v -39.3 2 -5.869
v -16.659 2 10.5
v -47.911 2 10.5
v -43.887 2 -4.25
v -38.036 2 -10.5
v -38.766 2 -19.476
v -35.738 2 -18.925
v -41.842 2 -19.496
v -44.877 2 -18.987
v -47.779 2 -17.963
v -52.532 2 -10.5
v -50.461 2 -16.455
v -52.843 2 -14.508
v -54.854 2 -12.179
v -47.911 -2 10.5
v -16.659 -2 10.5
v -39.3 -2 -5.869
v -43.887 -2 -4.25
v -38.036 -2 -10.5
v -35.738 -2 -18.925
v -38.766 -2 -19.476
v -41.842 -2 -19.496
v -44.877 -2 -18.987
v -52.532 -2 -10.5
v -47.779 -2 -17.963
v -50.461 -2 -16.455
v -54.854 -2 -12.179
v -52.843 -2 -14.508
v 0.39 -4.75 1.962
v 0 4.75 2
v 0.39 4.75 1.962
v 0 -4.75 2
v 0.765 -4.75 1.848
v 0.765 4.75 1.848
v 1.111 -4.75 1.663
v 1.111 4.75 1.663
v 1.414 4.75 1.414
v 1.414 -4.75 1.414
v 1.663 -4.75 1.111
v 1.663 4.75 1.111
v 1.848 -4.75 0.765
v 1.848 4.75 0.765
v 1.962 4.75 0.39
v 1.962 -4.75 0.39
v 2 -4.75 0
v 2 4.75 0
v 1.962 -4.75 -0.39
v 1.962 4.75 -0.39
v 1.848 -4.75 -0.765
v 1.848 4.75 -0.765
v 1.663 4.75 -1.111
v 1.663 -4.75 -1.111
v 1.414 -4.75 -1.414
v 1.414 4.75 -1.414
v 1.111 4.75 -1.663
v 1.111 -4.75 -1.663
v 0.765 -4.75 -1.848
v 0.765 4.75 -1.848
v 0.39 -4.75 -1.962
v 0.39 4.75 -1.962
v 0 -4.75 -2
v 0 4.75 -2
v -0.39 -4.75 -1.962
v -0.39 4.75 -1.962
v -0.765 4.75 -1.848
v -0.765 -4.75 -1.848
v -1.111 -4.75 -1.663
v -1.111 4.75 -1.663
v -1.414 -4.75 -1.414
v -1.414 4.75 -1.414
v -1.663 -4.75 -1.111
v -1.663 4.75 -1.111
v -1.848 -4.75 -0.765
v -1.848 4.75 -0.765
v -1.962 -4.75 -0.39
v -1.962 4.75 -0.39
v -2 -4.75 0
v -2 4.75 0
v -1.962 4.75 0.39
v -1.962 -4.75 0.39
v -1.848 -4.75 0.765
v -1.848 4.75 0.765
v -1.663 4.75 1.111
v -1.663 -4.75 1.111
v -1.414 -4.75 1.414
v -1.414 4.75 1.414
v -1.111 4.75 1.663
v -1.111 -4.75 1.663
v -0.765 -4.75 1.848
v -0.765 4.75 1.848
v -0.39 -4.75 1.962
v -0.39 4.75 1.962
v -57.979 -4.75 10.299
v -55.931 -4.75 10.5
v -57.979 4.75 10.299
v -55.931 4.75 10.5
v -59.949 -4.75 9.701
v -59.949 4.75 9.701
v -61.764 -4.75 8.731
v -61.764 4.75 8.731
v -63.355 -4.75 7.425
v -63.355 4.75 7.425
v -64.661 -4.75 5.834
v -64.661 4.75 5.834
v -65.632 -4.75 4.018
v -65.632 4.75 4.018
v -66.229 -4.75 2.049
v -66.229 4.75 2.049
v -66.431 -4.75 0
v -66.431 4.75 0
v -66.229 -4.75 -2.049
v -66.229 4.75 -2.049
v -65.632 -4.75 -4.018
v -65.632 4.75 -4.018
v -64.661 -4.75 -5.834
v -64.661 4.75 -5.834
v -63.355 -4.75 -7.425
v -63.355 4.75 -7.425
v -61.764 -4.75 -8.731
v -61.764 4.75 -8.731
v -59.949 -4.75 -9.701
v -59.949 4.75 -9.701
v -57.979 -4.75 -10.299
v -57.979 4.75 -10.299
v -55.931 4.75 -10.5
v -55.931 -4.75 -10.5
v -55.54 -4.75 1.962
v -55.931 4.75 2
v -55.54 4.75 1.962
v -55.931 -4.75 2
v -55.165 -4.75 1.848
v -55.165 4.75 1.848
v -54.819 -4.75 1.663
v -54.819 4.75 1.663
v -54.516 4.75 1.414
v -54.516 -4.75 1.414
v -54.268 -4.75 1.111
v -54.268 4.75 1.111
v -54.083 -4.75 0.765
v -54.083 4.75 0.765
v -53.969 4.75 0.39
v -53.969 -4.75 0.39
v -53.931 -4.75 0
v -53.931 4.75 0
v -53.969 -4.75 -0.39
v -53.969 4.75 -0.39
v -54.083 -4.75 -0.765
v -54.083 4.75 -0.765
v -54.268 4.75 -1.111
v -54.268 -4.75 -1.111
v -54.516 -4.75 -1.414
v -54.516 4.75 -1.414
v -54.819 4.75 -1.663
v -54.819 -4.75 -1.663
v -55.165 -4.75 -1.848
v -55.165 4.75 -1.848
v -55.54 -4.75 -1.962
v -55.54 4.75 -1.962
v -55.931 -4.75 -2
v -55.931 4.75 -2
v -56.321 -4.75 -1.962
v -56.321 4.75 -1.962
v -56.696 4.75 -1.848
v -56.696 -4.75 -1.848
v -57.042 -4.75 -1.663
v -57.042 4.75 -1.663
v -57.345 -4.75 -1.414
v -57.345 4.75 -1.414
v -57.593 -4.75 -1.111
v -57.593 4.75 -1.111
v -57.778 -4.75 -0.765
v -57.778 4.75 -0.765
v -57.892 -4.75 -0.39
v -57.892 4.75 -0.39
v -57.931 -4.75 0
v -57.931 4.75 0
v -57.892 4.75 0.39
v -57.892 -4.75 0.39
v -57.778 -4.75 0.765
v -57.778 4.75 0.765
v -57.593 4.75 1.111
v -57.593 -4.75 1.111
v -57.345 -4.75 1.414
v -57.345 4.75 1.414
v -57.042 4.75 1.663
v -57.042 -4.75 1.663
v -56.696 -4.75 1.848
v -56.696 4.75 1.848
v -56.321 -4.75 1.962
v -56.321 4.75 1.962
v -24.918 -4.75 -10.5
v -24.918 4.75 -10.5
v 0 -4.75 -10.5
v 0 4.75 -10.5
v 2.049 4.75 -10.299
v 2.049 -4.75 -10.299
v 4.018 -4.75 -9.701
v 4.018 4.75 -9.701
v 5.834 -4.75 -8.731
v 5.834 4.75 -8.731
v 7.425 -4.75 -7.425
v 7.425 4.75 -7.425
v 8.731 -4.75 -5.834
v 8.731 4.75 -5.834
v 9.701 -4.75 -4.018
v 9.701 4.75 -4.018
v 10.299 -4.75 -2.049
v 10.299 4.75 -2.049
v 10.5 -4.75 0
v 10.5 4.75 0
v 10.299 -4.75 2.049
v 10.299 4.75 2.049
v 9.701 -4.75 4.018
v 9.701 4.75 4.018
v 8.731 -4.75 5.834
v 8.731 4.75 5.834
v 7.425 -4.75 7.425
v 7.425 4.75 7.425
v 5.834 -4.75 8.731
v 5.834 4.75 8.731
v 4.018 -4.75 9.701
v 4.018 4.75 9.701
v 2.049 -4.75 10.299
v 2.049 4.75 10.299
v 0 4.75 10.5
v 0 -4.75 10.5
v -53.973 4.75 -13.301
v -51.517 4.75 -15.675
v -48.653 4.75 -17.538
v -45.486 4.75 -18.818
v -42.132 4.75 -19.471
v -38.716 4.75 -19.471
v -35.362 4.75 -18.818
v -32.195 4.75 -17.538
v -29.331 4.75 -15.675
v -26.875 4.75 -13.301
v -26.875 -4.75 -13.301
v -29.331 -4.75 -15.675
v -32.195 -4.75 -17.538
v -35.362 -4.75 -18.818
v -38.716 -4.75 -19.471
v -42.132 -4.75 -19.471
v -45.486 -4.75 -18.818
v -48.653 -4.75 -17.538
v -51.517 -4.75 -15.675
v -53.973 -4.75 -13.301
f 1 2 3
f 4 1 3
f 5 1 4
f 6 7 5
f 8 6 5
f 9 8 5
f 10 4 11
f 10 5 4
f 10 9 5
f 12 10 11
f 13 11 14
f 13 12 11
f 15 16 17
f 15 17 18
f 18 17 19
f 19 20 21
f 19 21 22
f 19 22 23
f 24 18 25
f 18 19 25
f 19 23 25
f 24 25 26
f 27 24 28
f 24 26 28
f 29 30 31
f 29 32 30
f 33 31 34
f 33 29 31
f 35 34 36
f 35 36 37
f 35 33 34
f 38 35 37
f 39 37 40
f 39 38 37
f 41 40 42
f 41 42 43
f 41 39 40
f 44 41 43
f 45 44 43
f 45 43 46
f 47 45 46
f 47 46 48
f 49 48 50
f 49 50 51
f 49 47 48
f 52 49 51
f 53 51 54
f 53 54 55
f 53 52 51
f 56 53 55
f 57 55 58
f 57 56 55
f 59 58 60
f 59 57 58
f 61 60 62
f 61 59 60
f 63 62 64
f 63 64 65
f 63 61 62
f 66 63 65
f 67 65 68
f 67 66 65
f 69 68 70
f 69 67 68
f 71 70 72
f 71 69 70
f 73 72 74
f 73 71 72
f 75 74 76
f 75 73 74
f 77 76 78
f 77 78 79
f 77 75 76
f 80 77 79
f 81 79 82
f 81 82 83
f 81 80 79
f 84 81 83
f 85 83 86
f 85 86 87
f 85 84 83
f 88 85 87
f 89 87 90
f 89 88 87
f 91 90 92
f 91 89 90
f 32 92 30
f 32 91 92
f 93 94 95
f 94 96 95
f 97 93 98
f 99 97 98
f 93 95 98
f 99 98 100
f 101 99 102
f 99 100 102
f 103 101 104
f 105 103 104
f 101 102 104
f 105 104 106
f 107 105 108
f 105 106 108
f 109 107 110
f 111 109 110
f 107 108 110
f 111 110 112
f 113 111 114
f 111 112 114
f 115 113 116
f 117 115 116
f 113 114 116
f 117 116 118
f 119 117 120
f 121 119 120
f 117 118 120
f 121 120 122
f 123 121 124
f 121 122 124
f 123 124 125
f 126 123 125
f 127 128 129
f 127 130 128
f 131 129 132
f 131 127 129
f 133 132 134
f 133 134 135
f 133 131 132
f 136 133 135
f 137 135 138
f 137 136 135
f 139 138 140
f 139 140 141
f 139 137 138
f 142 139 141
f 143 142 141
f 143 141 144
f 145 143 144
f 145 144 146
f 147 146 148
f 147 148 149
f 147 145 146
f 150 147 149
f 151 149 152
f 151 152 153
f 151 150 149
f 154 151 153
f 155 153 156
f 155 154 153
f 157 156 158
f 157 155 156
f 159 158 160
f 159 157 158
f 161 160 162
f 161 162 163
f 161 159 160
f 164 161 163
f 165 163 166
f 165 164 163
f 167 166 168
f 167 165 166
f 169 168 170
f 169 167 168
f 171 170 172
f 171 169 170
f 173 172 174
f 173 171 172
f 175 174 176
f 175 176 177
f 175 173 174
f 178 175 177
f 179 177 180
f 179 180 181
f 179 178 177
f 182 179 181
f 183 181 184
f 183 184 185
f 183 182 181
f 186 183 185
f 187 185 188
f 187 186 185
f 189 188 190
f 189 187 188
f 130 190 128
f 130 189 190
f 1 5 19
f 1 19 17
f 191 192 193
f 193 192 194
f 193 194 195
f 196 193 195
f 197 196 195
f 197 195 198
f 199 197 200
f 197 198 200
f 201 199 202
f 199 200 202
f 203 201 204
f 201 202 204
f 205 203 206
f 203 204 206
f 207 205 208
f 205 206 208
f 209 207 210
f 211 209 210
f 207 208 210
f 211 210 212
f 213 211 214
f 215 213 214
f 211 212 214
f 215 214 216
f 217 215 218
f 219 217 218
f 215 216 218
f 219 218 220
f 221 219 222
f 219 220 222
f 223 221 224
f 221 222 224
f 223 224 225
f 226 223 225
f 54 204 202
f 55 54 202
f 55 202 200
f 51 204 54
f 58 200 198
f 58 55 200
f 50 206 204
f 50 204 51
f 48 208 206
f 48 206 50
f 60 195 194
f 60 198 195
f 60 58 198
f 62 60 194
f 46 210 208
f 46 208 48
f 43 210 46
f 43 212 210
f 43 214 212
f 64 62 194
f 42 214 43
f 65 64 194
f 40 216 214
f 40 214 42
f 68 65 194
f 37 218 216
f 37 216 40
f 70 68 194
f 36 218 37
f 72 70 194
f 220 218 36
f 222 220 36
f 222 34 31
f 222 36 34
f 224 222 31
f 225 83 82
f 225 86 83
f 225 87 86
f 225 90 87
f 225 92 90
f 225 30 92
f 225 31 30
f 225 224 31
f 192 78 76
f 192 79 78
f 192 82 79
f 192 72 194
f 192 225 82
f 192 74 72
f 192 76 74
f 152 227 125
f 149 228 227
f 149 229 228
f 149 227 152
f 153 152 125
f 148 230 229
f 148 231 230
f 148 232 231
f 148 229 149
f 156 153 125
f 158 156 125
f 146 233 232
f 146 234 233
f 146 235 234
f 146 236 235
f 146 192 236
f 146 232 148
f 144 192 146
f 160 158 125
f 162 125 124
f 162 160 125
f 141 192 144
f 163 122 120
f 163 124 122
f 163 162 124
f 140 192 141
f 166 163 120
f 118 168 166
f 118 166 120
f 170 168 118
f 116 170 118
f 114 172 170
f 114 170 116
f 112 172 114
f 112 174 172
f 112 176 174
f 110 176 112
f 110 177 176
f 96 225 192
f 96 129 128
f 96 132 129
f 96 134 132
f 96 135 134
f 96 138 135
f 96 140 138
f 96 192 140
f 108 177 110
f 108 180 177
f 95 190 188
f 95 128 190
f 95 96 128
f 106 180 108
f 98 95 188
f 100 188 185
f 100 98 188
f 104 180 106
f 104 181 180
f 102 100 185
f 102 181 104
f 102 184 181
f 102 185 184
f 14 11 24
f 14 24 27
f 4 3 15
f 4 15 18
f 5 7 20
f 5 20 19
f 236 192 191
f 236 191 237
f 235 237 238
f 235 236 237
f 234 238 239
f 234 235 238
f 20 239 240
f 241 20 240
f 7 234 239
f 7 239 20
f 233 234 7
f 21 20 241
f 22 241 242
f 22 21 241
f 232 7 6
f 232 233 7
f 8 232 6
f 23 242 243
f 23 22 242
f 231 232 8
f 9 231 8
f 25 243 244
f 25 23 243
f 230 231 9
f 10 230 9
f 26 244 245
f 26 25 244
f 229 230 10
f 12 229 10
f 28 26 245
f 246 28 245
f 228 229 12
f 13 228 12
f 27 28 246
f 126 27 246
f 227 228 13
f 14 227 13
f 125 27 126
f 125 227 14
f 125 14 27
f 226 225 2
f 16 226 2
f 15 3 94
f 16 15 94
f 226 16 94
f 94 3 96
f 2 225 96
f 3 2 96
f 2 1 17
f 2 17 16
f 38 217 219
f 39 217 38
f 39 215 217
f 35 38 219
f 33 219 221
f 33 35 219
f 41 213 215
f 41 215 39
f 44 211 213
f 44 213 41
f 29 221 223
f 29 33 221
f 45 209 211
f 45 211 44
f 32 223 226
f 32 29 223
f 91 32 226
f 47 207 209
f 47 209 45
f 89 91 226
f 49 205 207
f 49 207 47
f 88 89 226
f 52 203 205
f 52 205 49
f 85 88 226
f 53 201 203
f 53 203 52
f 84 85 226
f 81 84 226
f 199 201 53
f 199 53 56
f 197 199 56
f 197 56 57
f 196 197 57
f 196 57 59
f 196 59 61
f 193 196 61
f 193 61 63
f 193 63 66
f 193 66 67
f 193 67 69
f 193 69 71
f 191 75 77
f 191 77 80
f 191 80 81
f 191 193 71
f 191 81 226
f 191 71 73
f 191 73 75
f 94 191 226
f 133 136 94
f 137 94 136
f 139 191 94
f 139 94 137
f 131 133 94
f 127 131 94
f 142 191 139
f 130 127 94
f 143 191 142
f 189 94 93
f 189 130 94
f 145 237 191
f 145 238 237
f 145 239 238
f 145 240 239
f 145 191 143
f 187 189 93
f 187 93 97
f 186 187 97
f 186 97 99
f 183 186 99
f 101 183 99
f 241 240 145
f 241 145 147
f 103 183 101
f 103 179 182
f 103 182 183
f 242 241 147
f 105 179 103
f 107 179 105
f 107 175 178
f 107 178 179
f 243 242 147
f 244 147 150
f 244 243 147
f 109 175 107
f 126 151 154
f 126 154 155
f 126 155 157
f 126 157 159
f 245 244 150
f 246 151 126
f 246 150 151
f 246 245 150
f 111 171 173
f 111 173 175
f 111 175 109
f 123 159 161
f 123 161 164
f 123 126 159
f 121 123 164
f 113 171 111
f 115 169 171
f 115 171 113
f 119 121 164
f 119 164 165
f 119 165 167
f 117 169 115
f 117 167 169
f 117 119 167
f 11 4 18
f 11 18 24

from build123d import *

# Parameters (mm, degrees)
SKETCH1_R                       = 2
BOSS_EXTRUDE1_DEPTH             = 4.75
CUT_EXTRUDE1_DEPTH              = 2
BOSS_EXTRUDE2_REACH             = 69.423
BOSS_EXTRUDE2_DIRECTION_2_REACH = 69.423
CUT_EXTRUDE2_DEPTH              = 2


with BuildPart() as part:
    # Sketch1 → Boss-Extrude1 (new, symmetric)
    with BuildSketch(Plane(origin=(0, 0, 0), x_dir=(1, 0, 0), z_dir=(0, 1, 0))):
        with BuildLine():
            Line((0, -10.500399217), (-55.93053828, -10.500399217))
            ThreePointArc((-55.93053828, -10.500399217), (-66.430937497, 0), (-55.93053828, 10.500399217))
            Line((-55.93053828, 10.500399217), (0, 10.500399217))
            ThreePointArc((0, 10.500399217), (10.500399217, 0), (0, -10.500399217))
        make_face()
        with Locations(Location((0, 0, 0), (0, 0, 270))):
            Circle(SKETCH1_R, mode=Mode.SUBTRACT)
        with Locations(Location((-55.93053828, 0, 0), (0, 0, 270))):
            Circle(SKETCH1_R, mode=Mode.SUBTRACT)
    extrude(amount=BOSS_EXTRUDE1_DEPTH, both=True)

    # Sketch3 → Cut-Extrude1 (cut, symmetric)
    with BuildSketch(Plane(origin=(0, 0, 0), x_dir=(1, 0, 0), z_dir=(0, 1, 0))):
        with BuildLine():
            Line((-35.751827911, 18.875253657), (-39.299525946, 5.868950542))
            Line((-39.299525946, 5.868950542), (26.645239155, -41.810424095))
            ThreePointArc((26.645239155, -41.810424095), (-18.563858299, -45.972421055), (-48.206523525, -11.584965354))
            Line((-48.206523525, -11.584965354), (-43.887265107, 4.249974277))
            Line((-43.887265107, 4.249974277), (-54.812276631, 12.148974547))
            ThreePointArc((-54.812276631, 12.148974547), (-46.585078234, 19.204535889), (-35.751827911, 18.875253657))
        make_face()
    extrude(amount=CUT_EXTRUDE1_DEPTH, both=True, mode=Mode.SUBTRACT)

    # Boss-Extrude2: up to this face of the body (flat: up to its plane)
    boss_extrude2_end = Plane(part.part.faces().sort_by_distance((-27.96526914, 4.75, 0))[0])
    # Sketch5 → Boss-Extrude2 (add, up to the picked face)
    with BuildSketch(Plane(origin=(0, 0, 0), x_dir=(1, 0, 0), z_dir=(0, 1, 0)), mode=Mode.PRIVATE) as boss_extrude2_sk1:
        with BuildLine():
            ThreePointArc((-24.917700351, 10.500399217), (-40.424119316, 19.553005923), (-55.93053828, 10.500399217))
            Line((-55.93053828, 10.500399217), (-24.917700351, 10.500399217))
        make_face()
    boss_extrude2_tool1 = split(extrude(boss_extrude2_sk1.sketch, amount=BOSS_EXTRUDE2_REACH, mode=Mode.PRIVATE), bisect_by=boss_extrude2_end, keep=Keep.BOTH, mode=Mode.PRIVATE)
    add(boss_extrude2_tool1.solids().sort_by(Axis((-40.424119, 0, -14.214125), (0, 1, 0)))[0])

    # Boss-Extrude2 direction 2: up to this face of the body (flat: up to its plane)
    boss_extrude2_direction_2_end = Plane(part.part.faces().sort_by_distance((-27.96526914, -4.75, 0))[0])
    # Sketch5 → Boss-Extrude2 direction 2 (add, up to the picked face)
    with BuildSketch(Plane(origin=(0, 0, 0), x_dir=(1, 0, 0), z_dir=(0, 1, 0)), mode=Mode.PRIVATE) as boss_extrude2_direction_2_sk1:
        with BuildLine():
            ThreePointArc((-24.917700351, 10.500399217), (-40.424119316, 19.553005923), (-55.93053828, 10.500399217))
            Line((-55.93053828, 10.500399217), (-24.917700351, 10.500399217))
        make_face()
    boss_extrude2_direction_2_tool1 = split(extrude(boss_extrude2_direction_2_sk1.sketch, amount=-BOSS_EXTRUDE2_DIRECTION_2_REACH, mode=Mode.PRIVATE), bisect_by=boss_extrude2_direction_2_end, keep=Keep.BOTH, mode=Mode.PRIVATE)
    add(boss_extrude2_direction_2_tool1.solids().sort_by(Axis((-40.424119, 0, -14.214125), (0, -1, 0)))[0])

    # Sketch6 → Cut-Extrude2 (cut, symmetric)
    with BuildSketch(Plane(origin=(0, 0, 0), x_dir=(1, 0, 0), z_dir=(0, 1, 0))):
        with BuildLine():
            Line((-39.299525946, 5.868950542), (-16.659276721, -10.500399217))
            Line((-16.659276721, -10.500399217), (-47.910689027, -10.500399217))
            Line((-47.910689027, -10.500399217), (-43.887265107, 4.249974277))
            Line((-43.887265107, 4.249974277), (-54.854382526, 12.179417945))
            ThreePointArc((-54.854382526, 12.179417945), (-46.349897212, 18.538096729), (-35.738154791, 18.925381021))
            Line((-35.738154791, 18.925381021), (-39.299525946, 5.868950542))
        make_face()
    extrude(amount=CUT_EXTRUDE2_DEPTH, both=True, mode=Mode.SUBTRACT)


solid = part.part
